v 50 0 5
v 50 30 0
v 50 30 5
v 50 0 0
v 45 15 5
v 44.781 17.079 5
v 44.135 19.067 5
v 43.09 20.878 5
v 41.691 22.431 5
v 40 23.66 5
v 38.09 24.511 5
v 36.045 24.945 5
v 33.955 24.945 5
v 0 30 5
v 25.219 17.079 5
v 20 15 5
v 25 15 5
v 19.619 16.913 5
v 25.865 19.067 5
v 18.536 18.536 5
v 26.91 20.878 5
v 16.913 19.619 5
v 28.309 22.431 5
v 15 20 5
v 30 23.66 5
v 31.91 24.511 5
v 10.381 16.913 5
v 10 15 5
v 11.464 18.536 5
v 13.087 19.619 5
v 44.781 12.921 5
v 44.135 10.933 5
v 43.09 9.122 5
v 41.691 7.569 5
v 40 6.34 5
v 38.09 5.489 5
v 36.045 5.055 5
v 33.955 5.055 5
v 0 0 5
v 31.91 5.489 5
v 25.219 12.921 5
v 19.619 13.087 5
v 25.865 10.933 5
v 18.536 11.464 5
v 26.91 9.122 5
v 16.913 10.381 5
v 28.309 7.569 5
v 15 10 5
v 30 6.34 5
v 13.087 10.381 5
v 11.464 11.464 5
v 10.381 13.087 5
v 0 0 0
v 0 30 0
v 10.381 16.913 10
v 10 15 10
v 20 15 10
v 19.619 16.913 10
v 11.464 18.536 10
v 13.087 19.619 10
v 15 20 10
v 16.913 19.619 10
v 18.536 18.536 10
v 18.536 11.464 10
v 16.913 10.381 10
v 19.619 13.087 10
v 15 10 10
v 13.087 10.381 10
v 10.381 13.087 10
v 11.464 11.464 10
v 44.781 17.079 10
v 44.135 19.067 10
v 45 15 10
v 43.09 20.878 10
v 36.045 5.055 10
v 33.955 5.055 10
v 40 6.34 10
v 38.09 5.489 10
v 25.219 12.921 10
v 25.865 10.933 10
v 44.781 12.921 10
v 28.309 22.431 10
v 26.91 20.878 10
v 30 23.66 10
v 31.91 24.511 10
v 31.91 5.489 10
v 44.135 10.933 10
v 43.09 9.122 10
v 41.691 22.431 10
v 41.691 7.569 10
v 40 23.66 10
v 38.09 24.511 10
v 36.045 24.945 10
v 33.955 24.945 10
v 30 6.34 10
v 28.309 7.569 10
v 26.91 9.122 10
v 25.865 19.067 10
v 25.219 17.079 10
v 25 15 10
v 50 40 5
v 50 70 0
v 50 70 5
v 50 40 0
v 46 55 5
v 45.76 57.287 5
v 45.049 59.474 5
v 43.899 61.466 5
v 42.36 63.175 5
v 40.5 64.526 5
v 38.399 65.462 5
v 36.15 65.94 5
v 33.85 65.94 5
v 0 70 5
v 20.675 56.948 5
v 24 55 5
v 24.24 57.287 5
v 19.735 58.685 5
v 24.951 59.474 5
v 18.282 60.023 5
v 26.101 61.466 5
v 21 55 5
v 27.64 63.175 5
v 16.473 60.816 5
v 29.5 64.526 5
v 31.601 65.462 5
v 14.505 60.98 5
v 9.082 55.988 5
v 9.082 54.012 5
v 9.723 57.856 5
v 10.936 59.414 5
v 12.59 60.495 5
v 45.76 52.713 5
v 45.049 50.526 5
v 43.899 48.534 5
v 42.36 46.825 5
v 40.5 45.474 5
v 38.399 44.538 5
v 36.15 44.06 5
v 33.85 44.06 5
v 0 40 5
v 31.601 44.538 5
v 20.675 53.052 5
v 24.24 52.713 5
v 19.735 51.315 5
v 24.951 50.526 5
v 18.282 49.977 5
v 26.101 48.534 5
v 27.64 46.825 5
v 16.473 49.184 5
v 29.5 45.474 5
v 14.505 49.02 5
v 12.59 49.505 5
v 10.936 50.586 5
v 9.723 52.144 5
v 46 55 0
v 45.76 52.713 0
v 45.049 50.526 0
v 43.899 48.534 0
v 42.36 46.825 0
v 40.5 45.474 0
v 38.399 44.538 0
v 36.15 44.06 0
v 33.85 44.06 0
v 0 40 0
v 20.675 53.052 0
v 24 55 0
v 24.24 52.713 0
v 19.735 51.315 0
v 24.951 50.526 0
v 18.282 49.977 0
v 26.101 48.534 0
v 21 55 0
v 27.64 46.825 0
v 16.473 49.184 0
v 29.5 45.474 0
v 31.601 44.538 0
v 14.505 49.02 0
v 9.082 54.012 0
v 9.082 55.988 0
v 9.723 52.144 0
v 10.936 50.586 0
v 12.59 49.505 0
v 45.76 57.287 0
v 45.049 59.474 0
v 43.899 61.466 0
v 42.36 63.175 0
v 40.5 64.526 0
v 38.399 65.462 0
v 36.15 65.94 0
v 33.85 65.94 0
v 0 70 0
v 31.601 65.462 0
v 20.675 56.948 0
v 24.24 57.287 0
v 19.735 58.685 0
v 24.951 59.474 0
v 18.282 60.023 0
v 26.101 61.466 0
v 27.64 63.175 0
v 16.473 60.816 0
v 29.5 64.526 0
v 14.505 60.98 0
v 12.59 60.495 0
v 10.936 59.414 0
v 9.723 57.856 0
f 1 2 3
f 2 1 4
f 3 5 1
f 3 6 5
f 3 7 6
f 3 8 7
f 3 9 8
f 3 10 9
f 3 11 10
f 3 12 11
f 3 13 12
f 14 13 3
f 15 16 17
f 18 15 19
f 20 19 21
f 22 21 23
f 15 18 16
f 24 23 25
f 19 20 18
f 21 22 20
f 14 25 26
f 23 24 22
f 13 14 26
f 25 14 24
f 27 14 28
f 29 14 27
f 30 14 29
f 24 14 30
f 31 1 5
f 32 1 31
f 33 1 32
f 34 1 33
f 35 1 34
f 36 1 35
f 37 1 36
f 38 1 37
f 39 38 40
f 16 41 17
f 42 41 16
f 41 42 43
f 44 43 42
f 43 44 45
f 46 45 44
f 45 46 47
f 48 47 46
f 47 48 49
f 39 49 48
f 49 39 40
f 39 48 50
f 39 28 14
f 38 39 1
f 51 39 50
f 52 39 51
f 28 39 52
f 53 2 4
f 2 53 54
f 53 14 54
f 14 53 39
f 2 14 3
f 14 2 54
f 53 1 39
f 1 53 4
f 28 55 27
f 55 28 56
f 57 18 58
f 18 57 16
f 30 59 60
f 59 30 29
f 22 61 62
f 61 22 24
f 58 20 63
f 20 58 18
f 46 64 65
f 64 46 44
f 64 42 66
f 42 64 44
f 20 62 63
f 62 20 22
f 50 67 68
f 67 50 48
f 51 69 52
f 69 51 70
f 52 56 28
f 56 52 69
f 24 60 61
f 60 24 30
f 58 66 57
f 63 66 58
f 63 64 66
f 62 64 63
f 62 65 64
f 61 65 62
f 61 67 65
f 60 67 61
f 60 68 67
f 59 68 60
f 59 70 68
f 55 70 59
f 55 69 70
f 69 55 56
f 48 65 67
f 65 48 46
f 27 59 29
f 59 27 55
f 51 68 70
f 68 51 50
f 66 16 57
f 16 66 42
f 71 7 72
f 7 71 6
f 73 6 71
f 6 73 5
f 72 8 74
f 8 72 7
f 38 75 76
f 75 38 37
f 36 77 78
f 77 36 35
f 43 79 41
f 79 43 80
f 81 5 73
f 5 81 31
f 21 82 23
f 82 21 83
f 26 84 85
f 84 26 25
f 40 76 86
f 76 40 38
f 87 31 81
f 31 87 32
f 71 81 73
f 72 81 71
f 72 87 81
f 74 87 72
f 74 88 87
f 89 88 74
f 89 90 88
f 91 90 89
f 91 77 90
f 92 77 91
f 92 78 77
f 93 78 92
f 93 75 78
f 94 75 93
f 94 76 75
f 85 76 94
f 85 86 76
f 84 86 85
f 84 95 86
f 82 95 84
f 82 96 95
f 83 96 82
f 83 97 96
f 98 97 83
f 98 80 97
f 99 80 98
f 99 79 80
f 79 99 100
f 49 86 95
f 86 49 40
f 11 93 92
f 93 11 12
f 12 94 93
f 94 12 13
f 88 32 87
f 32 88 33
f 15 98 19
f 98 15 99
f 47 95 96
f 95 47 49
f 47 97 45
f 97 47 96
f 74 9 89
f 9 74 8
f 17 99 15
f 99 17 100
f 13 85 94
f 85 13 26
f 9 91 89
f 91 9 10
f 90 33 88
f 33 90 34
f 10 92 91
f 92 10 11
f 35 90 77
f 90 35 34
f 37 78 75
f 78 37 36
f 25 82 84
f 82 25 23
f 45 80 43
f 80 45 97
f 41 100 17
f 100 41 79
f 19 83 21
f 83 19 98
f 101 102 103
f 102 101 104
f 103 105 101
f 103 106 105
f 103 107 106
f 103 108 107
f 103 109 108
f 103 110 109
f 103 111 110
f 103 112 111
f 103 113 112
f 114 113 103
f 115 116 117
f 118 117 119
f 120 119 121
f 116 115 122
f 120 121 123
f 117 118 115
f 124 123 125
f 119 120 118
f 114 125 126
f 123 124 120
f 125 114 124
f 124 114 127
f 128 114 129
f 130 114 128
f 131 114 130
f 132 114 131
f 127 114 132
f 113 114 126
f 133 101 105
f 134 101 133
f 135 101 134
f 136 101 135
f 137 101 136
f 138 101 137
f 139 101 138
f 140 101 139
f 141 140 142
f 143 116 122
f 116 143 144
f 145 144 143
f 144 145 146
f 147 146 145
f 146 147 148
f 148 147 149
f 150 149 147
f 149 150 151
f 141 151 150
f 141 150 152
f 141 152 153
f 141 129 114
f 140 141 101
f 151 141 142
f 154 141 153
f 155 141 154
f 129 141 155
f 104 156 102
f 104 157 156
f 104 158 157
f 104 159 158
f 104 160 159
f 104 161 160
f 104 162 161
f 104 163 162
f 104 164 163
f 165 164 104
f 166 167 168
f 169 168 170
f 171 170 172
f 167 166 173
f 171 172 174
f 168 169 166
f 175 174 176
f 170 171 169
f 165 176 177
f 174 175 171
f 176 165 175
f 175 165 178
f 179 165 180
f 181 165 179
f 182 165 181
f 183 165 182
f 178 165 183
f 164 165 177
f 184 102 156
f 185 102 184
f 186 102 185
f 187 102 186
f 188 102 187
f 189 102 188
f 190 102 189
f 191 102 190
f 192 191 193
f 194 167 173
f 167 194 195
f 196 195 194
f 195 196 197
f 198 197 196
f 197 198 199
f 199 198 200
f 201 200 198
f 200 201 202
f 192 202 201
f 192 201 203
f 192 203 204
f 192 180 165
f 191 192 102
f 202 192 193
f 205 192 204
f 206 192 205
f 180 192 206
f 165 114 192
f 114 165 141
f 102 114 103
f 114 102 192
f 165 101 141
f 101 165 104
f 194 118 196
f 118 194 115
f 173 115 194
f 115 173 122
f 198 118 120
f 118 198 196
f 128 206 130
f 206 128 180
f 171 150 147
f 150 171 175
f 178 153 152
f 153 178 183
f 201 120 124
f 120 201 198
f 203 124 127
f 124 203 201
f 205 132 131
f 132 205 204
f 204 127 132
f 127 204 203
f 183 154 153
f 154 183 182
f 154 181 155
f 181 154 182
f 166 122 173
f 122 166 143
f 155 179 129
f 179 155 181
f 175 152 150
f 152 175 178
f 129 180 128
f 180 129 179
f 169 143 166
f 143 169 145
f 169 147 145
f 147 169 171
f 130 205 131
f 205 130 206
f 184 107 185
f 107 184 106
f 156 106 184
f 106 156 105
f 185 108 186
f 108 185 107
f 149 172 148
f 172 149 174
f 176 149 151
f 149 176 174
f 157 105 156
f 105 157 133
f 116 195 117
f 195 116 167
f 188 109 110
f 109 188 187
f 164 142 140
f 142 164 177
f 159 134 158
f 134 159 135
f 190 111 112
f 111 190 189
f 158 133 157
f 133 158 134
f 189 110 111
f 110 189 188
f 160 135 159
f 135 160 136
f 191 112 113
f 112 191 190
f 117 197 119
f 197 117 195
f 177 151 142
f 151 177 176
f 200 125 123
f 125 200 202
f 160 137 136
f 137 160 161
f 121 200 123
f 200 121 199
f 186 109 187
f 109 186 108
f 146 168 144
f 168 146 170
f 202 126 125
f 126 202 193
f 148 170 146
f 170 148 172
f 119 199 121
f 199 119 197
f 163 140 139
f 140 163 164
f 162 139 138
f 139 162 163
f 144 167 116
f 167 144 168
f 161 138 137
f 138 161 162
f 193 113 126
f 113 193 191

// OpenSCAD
//3D Shapes- Hole and Pin Test

//Pins
union(){
    cube([50, 30, 5]);
    translate([15, 15, 0]) cylinder(10, 5, 5);
    translate([35, 15, 0]) cylinder(10, 10, 10);
}

//Holes
translate ([0,40,0]) difference(){
cube([50, 30, 5]);
    
translate([15, 15, -1]) cylinder(10, 6, 6);
translate([35, 15, -1]) cylinder(10, 11, 11);
}
